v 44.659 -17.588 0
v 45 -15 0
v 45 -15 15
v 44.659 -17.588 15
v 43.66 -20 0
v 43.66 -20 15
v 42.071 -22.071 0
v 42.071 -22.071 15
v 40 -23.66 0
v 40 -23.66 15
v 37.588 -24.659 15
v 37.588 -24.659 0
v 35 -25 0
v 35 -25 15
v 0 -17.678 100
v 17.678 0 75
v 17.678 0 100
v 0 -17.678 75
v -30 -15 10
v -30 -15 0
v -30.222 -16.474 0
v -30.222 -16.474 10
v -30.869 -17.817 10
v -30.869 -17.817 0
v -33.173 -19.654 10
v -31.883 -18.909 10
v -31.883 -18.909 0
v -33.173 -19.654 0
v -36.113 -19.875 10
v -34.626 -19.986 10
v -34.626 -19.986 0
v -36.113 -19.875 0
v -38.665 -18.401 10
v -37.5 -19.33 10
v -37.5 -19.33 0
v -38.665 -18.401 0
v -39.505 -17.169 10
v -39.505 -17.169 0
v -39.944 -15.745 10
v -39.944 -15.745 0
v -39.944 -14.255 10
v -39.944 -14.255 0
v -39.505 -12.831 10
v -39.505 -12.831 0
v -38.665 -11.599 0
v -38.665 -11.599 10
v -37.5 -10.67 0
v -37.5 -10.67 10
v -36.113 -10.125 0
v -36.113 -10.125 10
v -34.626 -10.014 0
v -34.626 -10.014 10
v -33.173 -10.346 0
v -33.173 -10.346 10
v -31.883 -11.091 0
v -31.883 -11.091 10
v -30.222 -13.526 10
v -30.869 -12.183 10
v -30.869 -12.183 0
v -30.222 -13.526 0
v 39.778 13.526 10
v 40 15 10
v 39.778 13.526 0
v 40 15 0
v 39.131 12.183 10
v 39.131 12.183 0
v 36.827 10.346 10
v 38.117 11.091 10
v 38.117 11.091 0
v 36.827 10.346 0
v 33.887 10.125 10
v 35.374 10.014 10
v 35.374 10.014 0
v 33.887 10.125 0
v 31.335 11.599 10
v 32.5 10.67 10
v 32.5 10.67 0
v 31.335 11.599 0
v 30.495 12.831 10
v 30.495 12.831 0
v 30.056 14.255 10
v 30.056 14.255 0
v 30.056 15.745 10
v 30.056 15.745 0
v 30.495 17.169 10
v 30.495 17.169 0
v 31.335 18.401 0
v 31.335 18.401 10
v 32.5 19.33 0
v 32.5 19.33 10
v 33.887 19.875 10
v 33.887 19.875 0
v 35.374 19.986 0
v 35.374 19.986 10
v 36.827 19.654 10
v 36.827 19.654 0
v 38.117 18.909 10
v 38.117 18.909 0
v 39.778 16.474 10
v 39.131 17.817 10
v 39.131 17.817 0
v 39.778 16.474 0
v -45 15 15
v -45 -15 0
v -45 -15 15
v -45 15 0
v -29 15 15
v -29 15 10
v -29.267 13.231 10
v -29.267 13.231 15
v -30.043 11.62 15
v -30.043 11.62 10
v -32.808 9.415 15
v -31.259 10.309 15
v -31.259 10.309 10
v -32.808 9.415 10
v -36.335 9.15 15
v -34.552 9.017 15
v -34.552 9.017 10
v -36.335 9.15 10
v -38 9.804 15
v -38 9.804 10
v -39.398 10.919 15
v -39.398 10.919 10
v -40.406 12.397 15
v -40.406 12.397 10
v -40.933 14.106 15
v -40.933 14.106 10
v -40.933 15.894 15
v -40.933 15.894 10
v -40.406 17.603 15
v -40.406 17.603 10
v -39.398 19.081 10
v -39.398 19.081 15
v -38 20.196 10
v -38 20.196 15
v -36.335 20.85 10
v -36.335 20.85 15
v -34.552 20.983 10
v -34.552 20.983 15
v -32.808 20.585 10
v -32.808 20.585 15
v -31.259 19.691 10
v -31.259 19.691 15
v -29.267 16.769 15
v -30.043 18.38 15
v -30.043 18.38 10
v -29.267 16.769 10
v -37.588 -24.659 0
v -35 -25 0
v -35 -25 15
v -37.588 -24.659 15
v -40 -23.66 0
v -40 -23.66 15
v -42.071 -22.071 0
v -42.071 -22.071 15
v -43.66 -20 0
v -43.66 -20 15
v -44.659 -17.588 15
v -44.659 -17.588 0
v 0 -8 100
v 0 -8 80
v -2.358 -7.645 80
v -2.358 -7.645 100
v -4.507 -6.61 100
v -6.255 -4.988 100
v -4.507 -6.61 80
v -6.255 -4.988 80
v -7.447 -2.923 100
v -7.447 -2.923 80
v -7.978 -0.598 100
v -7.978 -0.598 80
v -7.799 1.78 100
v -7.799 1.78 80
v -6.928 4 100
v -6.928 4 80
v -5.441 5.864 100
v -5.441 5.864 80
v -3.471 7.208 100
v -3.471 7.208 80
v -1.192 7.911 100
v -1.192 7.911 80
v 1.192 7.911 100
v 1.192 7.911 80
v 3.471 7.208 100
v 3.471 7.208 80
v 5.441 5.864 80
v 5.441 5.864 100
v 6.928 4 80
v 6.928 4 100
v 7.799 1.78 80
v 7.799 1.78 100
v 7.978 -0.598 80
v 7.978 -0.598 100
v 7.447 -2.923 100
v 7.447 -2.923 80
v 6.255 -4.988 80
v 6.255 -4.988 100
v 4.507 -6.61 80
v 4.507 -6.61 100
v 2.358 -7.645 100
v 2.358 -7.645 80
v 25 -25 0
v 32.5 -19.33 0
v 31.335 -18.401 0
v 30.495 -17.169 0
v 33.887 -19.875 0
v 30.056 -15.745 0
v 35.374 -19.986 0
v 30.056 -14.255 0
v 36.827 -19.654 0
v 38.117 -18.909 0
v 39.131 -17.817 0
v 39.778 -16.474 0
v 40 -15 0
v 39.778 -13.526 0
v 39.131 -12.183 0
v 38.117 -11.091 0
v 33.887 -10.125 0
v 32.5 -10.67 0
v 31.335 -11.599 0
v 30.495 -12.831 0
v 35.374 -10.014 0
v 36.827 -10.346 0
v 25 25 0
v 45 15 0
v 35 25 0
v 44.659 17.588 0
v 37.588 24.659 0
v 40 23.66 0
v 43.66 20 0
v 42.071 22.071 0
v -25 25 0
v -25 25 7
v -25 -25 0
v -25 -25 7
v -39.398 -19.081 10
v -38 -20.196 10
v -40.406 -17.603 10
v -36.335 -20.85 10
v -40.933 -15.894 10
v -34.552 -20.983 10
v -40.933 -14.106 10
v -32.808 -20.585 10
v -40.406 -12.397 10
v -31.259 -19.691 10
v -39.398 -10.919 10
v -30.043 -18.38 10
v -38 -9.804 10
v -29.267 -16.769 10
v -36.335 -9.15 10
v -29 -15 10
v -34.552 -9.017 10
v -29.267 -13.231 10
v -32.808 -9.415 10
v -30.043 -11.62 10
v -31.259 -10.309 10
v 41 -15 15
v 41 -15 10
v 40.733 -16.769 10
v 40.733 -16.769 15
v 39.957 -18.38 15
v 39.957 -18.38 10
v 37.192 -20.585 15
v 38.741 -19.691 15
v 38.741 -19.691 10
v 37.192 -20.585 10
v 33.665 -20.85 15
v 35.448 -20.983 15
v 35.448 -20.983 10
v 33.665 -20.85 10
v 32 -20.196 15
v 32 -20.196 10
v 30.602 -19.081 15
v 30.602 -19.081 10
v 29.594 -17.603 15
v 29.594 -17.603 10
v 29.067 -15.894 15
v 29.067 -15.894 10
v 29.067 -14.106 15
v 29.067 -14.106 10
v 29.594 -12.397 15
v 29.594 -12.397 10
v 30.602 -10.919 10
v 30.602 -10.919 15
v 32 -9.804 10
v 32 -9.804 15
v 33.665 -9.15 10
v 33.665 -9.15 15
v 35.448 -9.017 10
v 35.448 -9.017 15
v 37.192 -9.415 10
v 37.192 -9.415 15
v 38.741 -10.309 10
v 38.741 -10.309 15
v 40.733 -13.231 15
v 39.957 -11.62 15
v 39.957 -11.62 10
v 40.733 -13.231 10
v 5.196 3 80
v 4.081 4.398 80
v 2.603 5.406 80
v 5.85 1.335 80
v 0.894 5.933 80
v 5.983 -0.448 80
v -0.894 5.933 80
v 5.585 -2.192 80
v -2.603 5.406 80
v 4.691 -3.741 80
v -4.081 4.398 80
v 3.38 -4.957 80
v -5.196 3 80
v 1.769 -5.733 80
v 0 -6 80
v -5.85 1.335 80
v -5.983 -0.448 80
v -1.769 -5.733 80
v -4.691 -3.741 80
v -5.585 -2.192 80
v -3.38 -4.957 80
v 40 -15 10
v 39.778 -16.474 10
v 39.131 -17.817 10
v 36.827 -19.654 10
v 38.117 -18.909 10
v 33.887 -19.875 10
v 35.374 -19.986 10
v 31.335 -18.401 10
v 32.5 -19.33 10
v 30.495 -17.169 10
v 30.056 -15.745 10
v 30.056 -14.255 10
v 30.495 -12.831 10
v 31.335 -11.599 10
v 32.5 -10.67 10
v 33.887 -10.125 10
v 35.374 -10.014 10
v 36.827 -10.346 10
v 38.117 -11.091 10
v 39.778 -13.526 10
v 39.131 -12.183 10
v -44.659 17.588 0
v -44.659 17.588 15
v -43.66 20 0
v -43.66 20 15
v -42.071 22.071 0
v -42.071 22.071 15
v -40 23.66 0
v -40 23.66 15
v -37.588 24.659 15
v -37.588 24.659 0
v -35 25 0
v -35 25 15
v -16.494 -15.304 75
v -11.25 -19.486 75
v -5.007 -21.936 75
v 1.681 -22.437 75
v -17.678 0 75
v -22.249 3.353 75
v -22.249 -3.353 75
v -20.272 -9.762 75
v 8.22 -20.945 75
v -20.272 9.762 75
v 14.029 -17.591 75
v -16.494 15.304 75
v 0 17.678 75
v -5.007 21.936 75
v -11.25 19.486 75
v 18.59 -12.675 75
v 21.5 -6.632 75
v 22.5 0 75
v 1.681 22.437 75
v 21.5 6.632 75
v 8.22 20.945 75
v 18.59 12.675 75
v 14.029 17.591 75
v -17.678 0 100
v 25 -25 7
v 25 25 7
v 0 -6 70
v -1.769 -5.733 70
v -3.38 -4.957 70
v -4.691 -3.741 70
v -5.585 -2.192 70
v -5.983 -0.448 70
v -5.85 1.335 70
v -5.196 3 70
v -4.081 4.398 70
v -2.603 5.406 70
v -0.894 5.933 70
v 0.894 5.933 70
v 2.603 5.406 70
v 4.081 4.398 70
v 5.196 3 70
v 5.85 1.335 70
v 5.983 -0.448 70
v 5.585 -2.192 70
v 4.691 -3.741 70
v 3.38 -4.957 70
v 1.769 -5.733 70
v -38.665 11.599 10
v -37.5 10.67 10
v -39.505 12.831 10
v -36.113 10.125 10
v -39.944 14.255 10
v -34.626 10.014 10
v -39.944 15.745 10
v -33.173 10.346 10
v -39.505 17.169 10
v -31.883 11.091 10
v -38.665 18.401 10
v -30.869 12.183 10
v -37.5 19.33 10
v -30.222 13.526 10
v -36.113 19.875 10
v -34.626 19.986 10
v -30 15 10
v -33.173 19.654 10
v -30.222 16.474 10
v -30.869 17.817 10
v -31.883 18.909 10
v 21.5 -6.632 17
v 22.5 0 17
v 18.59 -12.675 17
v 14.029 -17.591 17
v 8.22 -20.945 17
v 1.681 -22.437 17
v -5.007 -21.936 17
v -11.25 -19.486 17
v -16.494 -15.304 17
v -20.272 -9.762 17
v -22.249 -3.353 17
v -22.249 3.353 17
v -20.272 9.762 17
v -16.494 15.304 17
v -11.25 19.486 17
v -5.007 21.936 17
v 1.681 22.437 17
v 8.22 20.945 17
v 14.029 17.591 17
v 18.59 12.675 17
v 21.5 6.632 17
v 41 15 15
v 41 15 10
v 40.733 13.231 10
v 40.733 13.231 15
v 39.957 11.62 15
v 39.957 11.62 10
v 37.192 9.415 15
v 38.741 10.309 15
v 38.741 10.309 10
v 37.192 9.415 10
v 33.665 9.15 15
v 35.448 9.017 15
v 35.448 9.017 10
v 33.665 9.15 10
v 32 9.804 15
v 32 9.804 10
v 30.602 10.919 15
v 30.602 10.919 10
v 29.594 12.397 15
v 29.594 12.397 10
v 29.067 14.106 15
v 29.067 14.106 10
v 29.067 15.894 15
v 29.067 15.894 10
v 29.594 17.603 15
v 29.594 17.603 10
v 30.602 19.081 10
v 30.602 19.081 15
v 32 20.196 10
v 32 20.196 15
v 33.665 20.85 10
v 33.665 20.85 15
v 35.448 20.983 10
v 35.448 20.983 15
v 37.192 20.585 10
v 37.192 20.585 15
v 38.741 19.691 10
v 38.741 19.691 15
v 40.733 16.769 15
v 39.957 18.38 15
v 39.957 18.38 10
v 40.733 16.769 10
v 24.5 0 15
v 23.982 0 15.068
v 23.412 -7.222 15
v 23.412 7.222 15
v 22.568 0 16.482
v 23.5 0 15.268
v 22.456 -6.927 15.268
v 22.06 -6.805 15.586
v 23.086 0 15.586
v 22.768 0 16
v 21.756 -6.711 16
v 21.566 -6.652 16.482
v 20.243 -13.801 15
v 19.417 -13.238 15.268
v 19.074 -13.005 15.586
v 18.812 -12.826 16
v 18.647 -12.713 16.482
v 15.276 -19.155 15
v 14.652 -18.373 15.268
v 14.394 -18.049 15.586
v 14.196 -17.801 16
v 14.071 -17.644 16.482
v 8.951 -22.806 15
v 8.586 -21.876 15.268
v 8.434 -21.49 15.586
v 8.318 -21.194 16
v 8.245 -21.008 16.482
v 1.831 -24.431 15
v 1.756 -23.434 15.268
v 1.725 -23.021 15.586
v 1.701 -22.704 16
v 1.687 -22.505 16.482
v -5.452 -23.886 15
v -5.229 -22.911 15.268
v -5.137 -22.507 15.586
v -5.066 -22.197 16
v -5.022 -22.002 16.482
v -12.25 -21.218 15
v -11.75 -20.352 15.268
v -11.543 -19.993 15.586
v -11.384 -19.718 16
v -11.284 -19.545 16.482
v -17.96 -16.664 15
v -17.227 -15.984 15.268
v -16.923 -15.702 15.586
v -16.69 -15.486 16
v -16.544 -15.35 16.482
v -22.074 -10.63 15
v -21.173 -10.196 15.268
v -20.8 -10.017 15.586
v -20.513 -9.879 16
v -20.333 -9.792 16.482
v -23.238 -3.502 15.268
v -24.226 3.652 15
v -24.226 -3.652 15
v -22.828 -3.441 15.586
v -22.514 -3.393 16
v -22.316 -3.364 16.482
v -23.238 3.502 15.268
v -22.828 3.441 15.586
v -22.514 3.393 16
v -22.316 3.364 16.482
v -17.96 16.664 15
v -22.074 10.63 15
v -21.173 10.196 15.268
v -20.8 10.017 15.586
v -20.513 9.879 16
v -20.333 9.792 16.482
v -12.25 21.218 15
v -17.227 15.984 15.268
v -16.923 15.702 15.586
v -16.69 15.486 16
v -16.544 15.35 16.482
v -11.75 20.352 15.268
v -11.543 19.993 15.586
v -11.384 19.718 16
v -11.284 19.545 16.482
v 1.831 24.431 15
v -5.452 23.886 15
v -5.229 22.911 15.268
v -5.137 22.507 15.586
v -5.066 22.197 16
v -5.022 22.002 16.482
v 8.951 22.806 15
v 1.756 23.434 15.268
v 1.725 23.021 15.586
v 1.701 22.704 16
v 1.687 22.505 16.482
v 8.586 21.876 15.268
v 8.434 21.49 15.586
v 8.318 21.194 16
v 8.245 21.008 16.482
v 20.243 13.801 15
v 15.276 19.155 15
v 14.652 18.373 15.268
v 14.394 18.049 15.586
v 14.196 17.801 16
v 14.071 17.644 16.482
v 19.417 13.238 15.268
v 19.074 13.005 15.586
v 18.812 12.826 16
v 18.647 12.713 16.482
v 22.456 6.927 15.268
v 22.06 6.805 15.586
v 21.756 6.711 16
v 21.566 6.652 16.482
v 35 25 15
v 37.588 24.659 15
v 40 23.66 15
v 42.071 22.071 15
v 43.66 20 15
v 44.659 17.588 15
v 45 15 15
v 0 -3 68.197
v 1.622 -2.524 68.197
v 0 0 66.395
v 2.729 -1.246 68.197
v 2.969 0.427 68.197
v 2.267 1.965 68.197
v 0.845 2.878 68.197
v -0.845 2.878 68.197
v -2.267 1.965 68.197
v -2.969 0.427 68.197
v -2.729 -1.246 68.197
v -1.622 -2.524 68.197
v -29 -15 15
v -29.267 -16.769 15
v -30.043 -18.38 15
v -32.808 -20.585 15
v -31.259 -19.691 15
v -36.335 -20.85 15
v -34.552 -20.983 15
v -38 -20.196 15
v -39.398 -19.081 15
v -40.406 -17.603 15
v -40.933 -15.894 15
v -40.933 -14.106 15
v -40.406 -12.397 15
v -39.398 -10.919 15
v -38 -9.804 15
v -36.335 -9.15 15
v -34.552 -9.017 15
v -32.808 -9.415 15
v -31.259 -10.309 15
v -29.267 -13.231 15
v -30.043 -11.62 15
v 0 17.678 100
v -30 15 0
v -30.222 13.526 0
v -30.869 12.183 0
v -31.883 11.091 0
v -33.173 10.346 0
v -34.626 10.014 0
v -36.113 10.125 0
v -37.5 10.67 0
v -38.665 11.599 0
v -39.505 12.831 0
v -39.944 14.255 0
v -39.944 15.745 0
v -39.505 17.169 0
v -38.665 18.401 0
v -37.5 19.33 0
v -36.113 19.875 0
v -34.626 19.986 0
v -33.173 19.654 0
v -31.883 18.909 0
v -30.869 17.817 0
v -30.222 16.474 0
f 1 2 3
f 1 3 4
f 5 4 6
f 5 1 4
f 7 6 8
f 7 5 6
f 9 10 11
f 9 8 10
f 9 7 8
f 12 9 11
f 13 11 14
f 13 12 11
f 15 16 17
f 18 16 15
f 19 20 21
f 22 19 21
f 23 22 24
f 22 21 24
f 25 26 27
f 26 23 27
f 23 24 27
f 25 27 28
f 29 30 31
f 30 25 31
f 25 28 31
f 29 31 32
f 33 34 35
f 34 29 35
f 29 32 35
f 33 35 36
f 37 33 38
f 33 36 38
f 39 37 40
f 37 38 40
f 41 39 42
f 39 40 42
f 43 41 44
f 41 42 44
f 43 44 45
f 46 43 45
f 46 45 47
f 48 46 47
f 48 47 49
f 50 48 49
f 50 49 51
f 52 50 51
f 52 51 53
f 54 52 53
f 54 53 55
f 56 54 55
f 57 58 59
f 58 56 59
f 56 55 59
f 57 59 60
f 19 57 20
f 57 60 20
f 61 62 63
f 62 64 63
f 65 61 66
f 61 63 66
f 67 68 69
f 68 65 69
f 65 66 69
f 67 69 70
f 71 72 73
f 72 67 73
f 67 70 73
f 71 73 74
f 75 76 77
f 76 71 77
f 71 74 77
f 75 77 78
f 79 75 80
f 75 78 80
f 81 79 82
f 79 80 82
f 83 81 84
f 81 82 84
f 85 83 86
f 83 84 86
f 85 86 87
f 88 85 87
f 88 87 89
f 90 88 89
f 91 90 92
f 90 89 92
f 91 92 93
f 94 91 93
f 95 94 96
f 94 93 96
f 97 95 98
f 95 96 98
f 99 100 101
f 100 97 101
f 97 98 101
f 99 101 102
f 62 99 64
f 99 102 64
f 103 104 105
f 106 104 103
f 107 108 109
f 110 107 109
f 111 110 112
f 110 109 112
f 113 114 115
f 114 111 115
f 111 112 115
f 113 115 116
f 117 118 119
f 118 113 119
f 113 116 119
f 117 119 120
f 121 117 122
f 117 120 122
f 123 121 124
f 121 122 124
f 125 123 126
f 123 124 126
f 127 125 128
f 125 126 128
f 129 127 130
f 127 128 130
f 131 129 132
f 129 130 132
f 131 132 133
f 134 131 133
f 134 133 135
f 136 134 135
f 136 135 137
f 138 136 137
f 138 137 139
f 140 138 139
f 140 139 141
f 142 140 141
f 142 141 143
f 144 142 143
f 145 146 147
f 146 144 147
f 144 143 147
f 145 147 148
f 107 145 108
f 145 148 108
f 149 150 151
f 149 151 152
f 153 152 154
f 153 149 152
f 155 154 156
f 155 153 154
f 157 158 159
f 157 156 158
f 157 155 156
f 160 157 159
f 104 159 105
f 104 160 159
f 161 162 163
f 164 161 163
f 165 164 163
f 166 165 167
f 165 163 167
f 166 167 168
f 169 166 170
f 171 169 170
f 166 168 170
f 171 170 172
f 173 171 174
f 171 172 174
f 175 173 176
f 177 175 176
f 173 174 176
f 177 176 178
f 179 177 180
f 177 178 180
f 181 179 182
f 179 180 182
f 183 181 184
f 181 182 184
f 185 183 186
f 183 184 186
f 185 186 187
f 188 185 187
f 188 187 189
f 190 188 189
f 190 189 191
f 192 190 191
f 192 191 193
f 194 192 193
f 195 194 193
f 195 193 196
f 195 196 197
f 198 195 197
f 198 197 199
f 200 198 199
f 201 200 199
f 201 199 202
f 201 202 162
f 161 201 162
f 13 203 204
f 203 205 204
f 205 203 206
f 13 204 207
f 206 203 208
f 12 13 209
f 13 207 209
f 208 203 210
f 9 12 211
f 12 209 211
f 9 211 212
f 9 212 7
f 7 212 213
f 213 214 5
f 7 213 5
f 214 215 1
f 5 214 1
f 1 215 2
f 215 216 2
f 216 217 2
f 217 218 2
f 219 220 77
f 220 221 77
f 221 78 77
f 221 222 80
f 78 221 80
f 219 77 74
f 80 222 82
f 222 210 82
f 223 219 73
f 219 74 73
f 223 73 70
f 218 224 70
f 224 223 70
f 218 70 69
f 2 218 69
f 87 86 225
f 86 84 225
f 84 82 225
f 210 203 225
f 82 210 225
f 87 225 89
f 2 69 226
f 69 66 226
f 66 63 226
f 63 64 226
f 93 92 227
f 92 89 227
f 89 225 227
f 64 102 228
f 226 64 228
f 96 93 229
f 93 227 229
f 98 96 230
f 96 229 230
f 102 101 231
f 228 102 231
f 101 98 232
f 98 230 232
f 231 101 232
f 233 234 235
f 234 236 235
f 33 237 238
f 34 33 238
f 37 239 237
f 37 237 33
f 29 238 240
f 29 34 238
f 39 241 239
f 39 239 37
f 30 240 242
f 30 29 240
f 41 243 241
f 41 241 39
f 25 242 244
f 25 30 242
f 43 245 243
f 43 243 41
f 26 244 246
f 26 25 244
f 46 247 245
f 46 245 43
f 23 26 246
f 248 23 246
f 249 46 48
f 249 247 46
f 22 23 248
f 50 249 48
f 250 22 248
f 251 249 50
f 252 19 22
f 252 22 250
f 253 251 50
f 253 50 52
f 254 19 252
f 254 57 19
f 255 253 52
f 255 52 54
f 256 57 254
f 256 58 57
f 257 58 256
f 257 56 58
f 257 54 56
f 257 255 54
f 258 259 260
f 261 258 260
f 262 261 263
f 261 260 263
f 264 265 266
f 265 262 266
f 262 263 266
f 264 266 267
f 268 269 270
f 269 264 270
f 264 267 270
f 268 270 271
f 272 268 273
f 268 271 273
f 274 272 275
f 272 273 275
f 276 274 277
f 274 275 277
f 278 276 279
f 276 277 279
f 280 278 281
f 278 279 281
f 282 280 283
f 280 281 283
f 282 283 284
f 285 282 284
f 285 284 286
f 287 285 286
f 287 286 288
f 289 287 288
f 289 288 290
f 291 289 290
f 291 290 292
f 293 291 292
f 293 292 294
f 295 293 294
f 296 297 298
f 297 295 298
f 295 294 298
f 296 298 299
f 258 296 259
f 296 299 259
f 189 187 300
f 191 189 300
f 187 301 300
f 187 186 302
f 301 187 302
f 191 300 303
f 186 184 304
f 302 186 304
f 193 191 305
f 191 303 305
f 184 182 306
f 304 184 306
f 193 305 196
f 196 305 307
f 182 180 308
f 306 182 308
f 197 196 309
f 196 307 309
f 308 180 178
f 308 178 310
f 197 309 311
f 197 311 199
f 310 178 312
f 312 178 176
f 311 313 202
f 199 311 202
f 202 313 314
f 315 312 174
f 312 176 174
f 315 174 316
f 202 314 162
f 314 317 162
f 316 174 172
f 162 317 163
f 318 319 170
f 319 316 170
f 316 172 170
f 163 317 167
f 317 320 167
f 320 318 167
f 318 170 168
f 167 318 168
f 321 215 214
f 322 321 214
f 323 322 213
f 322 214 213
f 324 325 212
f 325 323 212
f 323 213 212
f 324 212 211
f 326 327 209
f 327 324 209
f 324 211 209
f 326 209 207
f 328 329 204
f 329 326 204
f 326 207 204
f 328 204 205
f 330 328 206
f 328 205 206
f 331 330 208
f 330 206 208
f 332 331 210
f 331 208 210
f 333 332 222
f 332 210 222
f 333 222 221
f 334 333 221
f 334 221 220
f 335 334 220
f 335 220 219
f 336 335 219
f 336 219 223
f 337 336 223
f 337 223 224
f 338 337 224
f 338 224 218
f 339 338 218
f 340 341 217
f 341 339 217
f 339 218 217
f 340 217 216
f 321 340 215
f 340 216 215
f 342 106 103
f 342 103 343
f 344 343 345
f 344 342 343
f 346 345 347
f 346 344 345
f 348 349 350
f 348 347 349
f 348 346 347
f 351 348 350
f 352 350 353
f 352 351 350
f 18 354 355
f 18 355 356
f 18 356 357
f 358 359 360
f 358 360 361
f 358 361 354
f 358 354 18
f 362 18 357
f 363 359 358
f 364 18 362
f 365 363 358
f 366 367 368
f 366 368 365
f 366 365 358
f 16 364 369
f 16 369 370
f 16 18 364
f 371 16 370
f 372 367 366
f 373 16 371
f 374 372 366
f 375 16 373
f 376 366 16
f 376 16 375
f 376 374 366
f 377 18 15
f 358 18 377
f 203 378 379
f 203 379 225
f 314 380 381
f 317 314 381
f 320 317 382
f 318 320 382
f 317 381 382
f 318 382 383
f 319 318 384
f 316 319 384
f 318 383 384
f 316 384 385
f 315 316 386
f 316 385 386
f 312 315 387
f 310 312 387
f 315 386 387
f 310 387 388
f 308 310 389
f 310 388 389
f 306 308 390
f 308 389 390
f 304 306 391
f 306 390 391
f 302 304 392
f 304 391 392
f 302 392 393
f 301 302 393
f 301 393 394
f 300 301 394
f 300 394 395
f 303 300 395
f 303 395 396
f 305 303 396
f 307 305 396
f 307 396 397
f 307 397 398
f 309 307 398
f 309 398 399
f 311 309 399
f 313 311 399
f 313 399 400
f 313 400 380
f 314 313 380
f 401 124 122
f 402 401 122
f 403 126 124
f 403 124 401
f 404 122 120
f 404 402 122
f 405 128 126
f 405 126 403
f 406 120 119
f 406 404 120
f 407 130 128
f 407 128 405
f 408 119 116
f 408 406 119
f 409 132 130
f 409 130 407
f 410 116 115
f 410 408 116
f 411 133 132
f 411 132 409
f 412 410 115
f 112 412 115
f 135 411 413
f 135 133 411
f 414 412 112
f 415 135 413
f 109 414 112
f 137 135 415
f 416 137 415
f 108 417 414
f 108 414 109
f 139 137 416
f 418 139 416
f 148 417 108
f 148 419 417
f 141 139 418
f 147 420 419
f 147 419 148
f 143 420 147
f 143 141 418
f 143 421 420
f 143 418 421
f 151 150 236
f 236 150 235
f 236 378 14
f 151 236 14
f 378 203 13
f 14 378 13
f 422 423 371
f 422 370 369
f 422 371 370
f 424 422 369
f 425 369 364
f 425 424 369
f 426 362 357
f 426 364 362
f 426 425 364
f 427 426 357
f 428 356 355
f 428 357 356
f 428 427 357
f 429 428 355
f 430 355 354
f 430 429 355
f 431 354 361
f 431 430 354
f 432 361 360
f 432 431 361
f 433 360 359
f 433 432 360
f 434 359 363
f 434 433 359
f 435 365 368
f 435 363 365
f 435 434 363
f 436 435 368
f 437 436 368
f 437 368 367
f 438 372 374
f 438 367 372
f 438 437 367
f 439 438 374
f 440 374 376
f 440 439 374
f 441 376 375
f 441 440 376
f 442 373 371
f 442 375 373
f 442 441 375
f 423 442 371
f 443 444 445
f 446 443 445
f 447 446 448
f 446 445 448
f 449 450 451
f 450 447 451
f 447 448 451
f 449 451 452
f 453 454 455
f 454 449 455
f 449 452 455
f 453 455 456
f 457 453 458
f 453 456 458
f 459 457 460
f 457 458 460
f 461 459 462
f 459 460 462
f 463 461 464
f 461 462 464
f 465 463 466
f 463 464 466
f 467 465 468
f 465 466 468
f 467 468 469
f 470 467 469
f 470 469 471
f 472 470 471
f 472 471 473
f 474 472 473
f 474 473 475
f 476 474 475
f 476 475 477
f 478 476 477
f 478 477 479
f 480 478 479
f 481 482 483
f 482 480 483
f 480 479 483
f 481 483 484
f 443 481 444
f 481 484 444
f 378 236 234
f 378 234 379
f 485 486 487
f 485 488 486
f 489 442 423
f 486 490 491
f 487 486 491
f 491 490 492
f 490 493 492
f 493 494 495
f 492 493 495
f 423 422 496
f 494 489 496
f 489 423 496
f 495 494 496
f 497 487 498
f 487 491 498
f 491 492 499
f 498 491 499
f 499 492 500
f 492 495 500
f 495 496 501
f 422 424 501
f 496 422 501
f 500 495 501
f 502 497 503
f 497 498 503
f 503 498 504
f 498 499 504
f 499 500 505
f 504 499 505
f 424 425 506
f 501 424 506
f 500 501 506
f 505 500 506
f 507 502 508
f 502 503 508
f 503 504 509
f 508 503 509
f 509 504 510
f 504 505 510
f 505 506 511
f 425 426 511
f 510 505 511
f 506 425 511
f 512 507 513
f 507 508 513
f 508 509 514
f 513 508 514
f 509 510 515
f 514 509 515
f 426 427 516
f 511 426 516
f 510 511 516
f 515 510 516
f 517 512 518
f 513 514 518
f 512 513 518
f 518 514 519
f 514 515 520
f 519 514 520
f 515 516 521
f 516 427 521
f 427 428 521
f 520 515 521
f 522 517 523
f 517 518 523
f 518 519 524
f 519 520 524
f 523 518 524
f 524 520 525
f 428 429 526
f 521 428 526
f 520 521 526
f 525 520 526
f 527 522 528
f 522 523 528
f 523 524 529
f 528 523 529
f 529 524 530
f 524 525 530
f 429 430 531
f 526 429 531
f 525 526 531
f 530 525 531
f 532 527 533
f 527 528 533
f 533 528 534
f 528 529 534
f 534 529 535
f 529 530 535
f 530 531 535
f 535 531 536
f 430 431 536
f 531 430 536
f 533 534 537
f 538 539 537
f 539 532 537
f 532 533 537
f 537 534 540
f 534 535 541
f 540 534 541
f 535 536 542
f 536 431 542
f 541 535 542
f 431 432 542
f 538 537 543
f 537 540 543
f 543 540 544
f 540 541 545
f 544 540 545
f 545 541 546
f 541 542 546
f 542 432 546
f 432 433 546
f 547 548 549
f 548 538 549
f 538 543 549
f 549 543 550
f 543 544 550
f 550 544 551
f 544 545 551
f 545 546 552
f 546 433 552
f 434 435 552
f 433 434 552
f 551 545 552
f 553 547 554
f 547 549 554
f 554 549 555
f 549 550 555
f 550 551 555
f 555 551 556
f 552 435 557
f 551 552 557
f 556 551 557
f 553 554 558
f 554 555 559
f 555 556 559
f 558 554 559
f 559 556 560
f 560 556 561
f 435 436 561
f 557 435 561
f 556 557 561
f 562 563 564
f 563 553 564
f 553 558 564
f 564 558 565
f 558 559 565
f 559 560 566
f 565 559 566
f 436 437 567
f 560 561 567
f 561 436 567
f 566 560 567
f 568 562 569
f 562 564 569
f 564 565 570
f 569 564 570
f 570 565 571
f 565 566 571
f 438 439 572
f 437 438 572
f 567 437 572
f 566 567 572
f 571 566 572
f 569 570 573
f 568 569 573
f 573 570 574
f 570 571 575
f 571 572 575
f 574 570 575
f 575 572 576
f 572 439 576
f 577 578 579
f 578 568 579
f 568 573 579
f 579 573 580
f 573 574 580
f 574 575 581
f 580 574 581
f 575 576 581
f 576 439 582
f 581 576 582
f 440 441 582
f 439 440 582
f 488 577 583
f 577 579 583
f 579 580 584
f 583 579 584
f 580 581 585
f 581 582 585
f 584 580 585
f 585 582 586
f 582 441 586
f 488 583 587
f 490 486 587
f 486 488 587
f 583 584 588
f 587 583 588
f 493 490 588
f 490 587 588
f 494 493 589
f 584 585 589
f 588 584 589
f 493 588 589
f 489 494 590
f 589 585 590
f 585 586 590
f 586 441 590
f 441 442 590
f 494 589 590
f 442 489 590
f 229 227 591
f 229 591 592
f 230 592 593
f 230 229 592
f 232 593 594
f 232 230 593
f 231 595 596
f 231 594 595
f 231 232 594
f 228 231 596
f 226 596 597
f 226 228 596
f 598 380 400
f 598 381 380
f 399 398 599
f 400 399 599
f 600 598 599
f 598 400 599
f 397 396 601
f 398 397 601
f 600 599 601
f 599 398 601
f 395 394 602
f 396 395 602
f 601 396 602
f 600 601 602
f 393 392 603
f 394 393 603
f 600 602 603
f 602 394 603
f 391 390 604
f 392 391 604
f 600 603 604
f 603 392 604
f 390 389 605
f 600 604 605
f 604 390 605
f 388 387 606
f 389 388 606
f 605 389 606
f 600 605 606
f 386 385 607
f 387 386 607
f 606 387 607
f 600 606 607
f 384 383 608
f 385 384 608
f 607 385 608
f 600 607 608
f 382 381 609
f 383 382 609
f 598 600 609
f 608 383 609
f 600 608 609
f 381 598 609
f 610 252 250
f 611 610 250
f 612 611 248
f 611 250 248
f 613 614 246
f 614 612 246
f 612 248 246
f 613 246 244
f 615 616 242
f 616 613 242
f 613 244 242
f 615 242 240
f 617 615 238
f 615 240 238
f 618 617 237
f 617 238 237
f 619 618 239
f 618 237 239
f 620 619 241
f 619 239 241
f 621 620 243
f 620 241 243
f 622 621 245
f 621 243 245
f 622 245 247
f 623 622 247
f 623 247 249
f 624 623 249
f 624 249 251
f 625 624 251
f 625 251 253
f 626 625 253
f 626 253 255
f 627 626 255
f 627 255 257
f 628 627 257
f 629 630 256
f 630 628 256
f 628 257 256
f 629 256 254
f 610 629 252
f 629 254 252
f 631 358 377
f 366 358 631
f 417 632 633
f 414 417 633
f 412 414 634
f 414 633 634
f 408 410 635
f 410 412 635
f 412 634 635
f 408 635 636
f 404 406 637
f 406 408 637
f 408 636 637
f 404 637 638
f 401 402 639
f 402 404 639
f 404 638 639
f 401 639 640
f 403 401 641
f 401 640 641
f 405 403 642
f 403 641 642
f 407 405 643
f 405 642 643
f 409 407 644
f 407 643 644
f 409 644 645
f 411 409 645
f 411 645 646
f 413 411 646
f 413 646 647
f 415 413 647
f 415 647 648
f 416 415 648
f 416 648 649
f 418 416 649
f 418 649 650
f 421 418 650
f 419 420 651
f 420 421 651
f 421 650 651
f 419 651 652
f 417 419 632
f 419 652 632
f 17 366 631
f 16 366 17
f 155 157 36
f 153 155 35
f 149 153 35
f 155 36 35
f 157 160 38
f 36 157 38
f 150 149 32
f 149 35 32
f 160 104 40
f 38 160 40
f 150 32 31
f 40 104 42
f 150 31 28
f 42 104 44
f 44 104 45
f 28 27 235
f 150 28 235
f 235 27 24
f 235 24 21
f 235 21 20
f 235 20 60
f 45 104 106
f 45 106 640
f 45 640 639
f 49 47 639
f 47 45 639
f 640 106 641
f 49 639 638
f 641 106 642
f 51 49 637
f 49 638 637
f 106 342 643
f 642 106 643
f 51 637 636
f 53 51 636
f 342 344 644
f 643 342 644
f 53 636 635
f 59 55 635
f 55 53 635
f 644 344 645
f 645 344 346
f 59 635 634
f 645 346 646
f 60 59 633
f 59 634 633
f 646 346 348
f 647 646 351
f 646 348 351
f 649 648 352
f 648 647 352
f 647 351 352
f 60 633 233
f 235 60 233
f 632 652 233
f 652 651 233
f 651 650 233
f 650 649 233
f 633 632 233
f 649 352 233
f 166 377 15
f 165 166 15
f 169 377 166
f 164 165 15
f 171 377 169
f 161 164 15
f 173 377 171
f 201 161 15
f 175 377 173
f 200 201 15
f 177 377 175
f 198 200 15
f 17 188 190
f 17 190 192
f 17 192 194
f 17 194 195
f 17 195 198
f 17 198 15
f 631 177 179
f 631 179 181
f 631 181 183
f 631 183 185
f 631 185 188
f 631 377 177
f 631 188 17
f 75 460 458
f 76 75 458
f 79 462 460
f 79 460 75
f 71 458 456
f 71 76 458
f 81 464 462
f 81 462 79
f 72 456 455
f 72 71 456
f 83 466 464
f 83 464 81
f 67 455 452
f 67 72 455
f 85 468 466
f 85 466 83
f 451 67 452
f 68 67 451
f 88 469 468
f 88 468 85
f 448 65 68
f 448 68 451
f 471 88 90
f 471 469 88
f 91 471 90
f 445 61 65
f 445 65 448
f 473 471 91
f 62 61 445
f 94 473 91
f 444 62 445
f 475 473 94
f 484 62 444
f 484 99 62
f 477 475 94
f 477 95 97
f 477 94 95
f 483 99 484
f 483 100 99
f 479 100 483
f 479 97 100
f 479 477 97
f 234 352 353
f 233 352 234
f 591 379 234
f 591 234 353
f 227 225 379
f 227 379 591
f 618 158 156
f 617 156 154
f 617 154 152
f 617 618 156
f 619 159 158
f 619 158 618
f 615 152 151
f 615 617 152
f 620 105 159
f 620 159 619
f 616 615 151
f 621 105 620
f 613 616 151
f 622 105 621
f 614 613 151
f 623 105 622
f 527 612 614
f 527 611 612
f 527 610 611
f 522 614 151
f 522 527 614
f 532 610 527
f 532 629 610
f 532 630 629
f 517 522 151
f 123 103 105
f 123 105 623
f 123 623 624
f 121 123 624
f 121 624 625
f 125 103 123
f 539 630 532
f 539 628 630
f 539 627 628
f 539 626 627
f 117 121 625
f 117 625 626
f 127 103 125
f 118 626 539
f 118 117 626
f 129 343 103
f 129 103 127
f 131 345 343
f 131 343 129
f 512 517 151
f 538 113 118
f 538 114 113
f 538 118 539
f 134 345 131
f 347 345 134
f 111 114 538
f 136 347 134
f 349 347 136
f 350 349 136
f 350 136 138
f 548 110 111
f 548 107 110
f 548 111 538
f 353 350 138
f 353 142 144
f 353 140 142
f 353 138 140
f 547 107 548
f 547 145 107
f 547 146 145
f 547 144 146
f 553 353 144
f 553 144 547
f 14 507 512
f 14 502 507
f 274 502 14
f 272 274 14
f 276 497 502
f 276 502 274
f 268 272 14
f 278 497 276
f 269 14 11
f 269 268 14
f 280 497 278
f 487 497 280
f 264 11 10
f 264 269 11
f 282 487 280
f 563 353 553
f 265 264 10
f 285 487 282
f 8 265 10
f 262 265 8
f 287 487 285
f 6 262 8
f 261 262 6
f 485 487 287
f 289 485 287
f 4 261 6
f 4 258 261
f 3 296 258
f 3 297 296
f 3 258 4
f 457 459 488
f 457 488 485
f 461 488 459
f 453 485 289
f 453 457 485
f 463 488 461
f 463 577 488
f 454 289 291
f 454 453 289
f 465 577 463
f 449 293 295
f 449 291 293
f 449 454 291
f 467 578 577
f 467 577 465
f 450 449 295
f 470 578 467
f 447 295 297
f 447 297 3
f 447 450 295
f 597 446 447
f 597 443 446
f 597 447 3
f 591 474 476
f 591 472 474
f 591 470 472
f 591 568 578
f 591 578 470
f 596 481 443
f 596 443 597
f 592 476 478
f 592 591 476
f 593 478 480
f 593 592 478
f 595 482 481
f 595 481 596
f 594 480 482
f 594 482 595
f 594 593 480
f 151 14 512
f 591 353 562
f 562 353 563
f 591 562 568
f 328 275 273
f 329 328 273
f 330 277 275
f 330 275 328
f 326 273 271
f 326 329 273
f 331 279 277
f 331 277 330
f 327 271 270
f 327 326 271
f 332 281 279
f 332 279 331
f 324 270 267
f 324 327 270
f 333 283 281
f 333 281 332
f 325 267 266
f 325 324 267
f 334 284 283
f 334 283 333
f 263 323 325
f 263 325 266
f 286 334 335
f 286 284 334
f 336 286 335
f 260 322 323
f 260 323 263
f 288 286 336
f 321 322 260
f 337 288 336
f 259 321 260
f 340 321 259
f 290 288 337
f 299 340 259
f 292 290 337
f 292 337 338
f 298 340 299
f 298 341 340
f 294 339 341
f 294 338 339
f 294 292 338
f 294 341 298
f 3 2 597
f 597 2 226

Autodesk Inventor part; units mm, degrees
ref_plane "YZ Plane" through (0, 0, 0) normal (1, 0, 0) x (0, 1, 0)
ref_plane "XZ Plane" through (0, 0, 0) normal (0, 1, 0) x (-1, 0, 0)
ref_plane "XY Plane" through (0, 0, 0) normal (0, 0, 1) x (1, 0, 0)
sketch "Sketch1" plane through (0, 0, 0) normal (0, 0, 1) x (1, 0, 0)
  line L0 (-65.8995, 0) -> (65.8995, 0) projected
  line L1 (0, -37.8995) -> (0, 37.8995) projected
  line L2 (-45, 0) -> (-45, 15)
  line L3 (-35, 25) -> (0, 25)
  arc A0 (-35, 25) -> (-45, 15) centre (-35, 15) ccw
  circle A1 centre (-35, 15) radius 5
  circle A2 centre (-35, 15) radius 6
  circle A3 centre (-35, -15) radius 6
  circle A4 centre (35, 15) radius 6
  circle A5 centre (35, -15) radius 6
  circle A6 centre (-35, -15) radius 5
  circle A7 centre (35, 15) radius 5
  circle A8 centre (35, -15) radius 5
  line L4 (-45, 0) -> (-45, -15)
  line L5 (-35, -25) -> (0, -25)
  arc A9 (-45, -15) -> (-35, -25) centre (-35, -15) ccw
  line L6 (45, 0) -> (45, 15)
  line L7 (35, 25) -> (0, 25)
  arc A10 (45, 15) -> (35, 25) centre (35, 15) ccw
  line L8 (35, -25) -> (0, -25)
  arc A11 (35, -25) -> (45, -15) centre (35, -15) ccw
  line L9 (45, 0) -> (45, -15)
  point P0 (0, 0)
  point P1 (-45, 25)
  point P2 (-45, -25)
  point P3 (45, 25)
  dimension "d3" = 50
  dimension "d4" = 90
  dimension "d6" = 10
  dimension "d10" = 5
  dimension "d14" = 6
extrude "Extrusion1" add sketch "Sketch1" along normal blind 15 contours L2 A0 L3 L1 L0 | L0 L1 L5 A9 L4 | L1 L7 A10 L6 L0 | L0 L9 A11 L8 L1
extrude "Extrusion2" add sketch "Sketch1" along normal blind 10 contours A2 | A3 | A4 | A5
sketch "Sketch2" plane through (-35, -25, 0) normal (0, -1, 0) x (1, 0, 0)
  line L0 (0, 0) -> (70, 0) projected
  line L1 (35, -3) -> (35, 18) projected
  line L2 (10, 7) -> (10, 0)
  line L3 (60, 7) -> (60, 0)
  line L4 (10, 7) -> (60, 7)
  line L5 (10, 0) -> (60, 0)
  point P0 (35, 0)
  dimension "d20" = 7
  dimension "d21" = 50
extrude "Extrusion3" cut sketch "Sketch2" against normal blind 50
sketch "Sketch3" plane through (0, 0, 15) normal (0, 0, 1) x (1, 0, 0)
  circle A0 centre (0, 0) radius 22.5
  dimension "d24" = 22.5
extrude "Extrusion4" add sketch "Sketch3" along normal blind 60
sketch "Sketch4" plane through (0, 0, 75) normal (0, 0, 1) x (1, 0, 0)
  circle A0 centre (0, 0) radius 22.5 projected
  line L0 (-17.6777, 0) -> (0, 17.6777)
  line L1 (0, 17.6777) -> (17.6777, 0)
  line L2 (17.6777, 0) -> (0, -17.6777)
  line L3 (0, -17.6777) -> (-17.6777, 0)
  dimension "d30" = 25
  dimension "d31" = 25
  dimension "d32" = 25
  dimension "d33" = 25
extrude "Extrusion5" add sketch "Sketch4" along normal blind 25 contours L0 L1 L2 L3
fillet "Fillet1" radius 2 1 edges at (-22.5, 0, 15)
hole "Hole1" at (0, 0, 100) direction (0, 0, -1) diameter 16 depth 20
hole "Hole2" at (0, 0, 80) direction (0, 0, -1) diameter 12 depth 10 tip angle 118
sketch "Sketch5" plane through (0, 0, 0) normal (1, 0, 0) x (0, 1, 0)
  line L0 (0, -20) -> (0, 120) projected
  line L1 (-25, 7) -> (25, 7) projected
  line L2 (-35, 0) -> (35, 0) projected
  line L3 (-15, 8.1453) -> (-15, 51.4254)
  line L4 (-15, 15) -> (15, 15) projected
  arc A0 (0, 66.4254) -> (-15, 51.4254) centre (0, 51.4254) ccw
  line L5 (0, 66.4254) -> (0, 7)
  line L6 (0, 7) -> (-15, 7)
  line L7 (0, 66.4254) -> (0, 7)
  point P0 (0, 0)
  point P1 (0, 15)
  point P2 (0, 15)
  point P3 (0, 15)
  dimension "d57" = 15
properties part number "Piesa 2 3D"
